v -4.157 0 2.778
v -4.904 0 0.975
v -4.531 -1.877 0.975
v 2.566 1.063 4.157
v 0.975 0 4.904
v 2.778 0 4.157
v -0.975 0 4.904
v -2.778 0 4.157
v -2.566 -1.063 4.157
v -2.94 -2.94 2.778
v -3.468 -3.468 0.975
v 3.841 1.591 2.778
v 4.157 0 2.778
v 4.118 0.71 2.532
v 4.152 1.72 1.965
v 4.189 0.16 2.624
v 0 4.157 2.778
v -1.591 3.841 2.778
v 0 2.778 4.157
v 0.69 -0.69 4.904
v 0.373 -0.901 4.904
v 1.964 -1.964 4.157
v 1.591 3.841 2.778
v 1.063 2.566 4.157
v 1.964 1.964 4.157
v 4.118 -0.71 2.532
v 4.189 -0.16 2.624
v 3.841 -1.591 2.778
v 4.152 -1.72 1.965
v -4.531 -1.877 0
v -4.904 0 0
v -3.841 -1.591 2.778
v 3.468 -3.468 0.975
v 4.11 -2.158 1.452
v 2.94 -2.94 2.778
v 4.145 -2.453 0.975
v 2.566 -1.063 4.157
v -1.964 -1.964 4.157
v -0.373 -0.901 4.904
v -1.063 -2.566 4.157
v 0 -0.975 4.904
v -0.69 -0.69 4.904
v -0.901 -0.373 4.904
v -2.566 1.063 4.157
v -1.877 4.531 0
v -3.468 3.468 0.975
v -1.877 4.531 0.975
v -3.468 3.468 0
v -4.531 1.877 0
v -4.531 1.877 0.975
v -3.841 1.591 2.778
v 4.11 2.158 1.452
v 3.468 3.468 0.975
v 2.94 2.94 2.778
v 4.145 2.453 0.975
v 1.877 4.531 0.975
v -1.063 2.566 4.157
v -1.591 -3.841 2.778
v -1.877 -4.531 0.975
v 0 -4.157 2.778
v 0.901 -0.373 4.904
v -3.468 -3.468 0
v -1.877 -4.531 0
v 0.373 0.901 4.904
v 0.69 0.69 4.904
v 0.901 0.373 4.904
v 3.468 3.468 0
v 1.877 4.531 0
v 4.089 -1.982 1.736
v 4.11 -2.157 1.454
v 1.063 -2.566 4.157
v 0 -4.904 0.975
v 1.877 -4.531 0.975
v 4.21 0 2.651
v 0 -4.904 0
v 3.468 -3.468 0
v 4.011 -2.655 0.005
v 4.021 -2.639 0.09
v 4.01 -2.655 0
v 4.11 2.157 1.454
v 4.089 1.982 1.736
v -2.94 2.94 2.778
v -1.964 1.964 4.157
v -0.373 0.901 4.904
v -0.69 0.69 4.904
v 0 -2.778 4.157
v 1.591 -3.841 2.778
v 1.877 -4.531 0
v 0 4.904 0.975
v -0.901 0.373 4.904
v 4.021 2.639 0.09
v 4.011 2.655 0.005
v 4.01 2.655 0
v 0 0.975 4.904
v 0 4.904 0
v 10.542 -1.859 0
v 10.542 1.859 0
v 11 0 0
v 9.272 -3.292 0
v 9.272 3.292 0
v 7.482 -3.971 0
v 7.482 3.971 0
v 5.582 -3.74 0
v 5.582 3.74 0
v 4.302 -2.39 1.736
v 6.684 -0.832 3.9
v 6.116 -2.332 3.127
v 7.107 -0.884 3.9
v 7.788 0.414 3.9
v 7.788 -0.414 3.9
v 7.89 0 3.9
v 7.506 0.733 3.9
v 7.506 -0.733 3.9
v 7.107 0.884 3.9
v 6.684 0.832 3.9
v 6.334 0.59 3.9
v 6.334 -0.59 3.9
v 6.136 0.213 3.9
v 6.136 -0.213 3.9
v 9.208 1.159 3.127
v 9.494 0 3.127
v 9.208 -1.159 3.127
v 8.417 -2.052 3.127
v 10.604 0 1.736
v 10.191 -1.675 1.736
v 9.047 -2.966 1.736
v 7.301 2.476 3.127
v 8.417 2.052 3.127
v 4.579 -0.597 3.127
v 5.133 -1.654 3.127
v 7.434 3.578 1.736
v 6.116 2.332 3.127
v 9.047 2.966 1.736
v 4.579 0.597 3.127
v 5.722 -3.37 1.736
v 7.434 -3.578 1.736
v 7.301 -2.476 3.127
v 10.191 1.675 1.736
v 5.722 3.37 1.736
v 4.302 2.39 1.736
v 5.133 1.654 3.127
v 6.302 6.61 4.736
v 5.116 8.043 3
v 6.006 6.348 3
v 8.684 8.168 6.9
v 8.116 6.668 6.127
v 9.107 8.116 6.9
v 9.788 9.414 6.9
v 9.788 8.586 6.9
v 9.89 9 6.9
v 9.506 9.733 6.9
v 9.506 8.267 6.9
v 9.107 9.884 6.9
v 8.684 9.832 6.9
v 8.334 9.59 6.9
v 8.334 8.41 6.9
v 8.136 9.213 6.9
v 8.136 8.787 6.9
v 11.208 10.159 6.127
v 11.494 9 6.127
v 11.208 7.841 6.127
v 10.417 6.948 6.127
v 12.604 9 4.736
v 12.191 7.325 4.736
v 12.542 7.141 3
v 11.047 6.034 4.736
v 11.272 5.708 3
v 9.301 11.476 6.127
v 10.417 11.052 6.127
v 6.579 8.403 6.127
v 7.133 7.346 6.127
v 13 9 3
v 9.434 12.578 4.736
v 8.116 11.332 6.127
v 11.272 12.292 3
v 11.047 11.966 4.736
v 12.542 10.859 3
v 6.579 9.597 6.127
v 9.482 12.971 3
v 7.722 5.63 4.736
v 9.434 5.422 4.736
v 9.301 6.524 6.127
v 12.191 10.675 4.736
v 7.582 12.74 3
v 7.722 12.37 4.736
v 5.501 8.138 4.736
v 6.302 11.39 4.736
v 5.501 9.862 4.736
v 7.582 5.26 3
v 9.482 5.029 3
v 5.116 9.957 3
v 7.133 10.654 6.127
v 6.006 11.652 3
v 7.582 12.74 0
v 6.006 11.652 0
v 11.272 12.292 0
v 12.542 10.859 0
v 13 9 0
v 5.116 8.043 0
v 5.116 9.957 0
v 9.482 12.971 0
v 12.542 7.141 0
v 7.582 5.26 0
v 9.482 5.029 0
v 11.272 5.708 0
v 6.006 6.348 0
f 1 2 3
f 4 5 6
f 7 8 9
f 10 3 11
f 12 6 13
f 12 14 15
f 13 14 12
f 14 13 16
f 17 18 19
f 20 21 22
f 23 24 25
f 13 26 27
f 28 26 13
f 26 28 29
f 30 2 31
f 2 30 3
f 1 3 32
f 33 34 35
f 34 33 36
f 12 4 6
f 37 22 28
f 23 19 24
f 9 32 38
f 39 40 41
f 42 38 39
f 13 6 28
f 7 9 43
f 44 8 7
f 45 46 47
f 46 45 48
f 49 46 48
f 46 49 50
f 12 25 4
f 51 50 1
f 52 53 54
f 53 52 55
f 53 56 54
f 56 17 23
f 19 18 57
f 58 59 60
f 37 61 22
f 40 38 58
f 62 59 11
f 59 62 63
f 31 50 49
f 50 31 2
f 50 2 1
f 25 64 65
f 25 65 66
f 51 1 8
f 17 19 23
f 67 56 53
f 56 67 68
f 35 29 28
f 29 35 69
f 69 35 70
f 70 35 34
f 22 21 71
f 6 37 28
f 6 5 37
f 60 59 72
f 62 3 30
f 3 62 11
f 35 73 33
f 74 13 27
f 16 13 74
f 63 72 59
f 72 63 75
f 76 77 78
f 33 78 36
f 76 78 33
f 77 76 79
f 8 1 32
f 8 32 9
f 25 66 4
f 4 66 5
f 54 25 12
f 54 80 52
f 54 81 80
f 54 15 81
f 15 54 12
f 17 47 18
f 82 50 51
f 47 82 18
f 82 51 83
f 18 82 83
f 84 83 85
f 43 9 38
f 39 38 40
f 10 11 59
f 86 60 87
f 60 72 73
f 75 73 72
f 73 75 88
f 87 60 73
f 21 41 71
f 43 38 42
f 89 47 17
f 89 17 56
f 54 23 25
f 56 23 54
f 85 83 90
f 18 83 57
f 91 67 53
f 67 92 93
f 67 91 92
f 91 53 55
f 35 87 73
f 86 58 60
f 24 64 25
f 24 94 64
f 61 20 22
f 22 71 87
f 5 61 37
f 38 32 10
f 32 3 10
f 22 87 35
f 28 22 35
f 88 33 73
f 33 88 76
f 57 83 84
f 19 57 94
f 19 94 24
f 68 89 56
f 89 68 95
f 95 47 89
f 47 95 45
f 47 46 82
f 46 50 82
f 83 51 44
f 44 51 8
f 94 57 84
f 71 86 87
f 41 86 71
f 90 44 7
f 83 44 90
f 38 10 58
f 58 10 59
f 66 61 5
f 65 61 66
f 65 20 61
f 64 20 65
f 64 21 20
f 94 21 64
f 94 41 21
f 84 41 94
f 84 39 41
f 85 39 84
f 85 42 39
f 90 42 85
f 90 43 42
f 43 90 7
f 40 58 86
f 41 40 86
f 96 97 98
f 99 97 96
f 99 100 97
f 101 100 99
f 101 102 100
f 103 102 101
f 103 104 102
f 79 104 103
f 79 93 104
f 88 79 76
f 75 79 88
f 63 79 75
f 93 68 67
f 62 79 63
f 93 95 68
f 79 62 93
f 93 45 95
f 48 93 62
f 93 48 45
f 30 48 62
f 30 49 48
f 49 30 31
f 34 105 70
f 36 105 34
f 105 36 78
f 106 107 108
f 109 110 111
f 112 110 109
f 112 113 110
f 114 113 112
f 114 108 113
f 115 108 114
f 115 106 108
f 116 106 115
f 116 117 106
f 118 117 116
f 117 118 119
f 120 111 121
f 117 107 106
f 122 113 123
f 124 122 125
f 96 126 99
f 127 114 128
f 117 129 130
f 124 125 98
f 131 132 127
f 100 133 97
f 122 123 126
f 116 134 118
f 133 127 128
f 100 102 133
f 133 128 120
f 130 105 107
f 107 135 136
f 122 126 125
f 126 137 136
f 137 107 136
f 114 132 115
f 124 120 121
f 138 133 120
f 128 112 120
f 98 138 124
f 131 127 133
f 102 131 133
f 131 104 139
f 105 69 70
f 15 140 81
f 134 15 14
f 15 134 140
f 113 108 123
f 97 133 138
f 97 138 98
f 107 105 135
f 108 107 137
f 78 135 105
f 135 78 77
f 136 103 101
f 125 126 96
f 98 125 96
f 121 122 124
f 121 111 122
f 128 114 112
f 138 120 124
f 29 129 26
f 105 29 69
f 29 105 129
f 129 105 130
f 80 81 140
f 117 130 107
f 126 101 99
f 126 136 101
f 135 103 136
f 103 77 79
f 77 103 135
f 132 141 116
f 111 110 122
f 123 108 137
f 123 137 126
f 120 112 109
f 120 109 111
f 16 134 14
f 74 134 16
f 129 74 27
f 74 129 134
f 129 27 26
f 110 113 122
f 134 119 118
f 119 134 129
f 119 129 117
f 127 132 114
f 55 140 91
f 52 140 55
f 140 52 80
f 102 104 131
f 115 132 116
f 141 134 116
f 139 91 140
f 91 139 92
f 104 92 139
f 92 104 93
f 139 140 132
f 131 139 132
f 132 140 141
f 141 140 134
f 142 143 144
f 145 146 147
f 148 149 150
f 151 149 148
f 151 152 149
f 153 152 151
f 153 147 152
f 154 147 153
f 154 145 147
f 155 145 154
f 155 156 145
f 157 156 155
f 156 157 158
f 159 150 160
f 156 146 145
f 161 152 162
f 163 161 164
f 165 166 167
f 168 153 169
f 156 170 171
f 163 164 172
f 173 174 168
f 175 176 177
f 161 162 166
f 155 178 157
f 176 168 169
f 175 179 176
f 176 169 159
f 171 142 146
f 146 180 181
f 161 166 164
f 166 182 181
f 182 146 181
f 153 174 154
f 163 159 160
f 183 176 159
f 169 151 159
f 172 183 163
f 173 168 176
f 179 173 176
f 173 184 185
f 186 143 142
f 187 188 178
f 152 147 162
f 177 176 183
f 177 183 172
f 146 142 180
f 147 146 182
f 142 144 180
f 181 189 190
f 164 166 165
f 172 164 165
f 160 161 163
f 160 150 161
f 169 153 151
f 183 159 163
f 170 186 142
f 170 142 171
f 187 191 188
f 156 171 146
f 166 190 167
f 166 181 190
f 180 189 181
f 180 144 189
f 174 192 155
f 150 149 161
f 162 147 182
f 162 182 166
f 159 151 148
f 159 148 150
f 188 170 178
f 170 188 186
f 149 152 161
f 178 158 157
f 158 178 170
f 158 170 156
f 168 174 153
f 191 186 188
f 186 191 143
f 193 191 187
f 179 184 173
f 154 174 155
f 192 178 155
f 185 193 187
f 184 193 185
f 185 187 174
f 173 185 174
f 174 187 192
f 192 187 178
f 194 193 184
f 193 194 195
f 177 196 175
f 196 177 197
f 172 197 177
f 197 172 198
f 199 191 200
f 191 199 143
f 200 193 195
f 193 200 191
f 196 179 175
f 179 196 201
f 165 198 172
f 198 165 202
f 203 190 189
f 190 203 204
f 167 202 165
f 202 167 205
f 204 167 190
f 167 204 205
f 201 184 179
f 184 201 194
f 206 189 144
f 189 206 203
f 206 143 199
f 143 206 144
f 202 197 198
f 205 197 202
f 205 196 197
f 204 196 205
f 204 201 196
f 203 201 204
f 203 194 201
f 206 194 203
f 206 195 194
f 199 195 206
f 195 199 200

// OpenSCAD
// file: ../src/cadence.scad
// sublist
//
function _sl(list, from=0, to) =
  let(end = (to == undef ? len(list) - 1 : to))
  [ for ( i = [from:end]) list[i] ];

function _normalize_angle(a) =
  ((a >= 0 && a <= 360) ? a : _normalize_angle(a + (a < 0 ? 360 : -360)));

// pineapple slice
//
module paslice(radius, depth, slice=45, radius1=0) {

  s = _normalize_angle(slice);

  r = radius;

  if (s > 0) difference() {

    cylinder(depth, r=radius);

    translate([ 0, 0, -0.1 ]) cylinder(depth * 1.1, r=radius1);

    if (s != 360) {

      pas = [
        [ 0, r ], [ 0, 0 ] ];
      pbs = [
        [ r, r ], [ r, 0 ], [ r, -r ], [ 0, -r ], [ -r, -r ], [ -r, 0 ],
        [ -r, r ] ];

      t = tan(s);
      tx = t * r;
      ty = r / t;

      translate([ 0, 0, -0.1 ]) linear_extrude(depth + 0.2)
        if (s <= 45) polygon(concat(pas, [ [ tx, r ] ], pbs));
        else if (s <= 135) polygon(concat(pas, [ [ r, ty ] ], _sl(pbs, 2)));
        else if (s <= 225) polygon(concat(pas, [ [ -tx, -r ] ], _sl(pbs, 4)));
        else if (s <= 315) polygon(concat(pas, [ [ -r, -ty ] ], _sl(pbs, 6)));
        else if (s < 360) polygon(concat(pas, [ [ tx, r ] ]));
    }
  }
}


// dome with optional trunk_height
//
module dome(radius=-1, diameter=-1, trunk_height=0) {

  r = radius; if (r < 0) { r = diameter / 2; }
  th = trunk_height;

  translate([ 0, 0, th ])
    difference() {
      sphere(r=r);
      translate([ 0, 0, -r ]) cube(2 * r, center=true);
    }
  translate([ 0, 0, trunk_height / 2 ])
    cylinder(r=r, h=trunk_height, center=true);
}
// main file
// test_dome.scad

use <../src/cadence.scad>;

translate([ 0, 0, 0 ]) dome(5);
translate([ 7, 0, 0 ]) dome(4);
translate([ 9, 9, 0 ]) dome(4, trunk_height=3);
